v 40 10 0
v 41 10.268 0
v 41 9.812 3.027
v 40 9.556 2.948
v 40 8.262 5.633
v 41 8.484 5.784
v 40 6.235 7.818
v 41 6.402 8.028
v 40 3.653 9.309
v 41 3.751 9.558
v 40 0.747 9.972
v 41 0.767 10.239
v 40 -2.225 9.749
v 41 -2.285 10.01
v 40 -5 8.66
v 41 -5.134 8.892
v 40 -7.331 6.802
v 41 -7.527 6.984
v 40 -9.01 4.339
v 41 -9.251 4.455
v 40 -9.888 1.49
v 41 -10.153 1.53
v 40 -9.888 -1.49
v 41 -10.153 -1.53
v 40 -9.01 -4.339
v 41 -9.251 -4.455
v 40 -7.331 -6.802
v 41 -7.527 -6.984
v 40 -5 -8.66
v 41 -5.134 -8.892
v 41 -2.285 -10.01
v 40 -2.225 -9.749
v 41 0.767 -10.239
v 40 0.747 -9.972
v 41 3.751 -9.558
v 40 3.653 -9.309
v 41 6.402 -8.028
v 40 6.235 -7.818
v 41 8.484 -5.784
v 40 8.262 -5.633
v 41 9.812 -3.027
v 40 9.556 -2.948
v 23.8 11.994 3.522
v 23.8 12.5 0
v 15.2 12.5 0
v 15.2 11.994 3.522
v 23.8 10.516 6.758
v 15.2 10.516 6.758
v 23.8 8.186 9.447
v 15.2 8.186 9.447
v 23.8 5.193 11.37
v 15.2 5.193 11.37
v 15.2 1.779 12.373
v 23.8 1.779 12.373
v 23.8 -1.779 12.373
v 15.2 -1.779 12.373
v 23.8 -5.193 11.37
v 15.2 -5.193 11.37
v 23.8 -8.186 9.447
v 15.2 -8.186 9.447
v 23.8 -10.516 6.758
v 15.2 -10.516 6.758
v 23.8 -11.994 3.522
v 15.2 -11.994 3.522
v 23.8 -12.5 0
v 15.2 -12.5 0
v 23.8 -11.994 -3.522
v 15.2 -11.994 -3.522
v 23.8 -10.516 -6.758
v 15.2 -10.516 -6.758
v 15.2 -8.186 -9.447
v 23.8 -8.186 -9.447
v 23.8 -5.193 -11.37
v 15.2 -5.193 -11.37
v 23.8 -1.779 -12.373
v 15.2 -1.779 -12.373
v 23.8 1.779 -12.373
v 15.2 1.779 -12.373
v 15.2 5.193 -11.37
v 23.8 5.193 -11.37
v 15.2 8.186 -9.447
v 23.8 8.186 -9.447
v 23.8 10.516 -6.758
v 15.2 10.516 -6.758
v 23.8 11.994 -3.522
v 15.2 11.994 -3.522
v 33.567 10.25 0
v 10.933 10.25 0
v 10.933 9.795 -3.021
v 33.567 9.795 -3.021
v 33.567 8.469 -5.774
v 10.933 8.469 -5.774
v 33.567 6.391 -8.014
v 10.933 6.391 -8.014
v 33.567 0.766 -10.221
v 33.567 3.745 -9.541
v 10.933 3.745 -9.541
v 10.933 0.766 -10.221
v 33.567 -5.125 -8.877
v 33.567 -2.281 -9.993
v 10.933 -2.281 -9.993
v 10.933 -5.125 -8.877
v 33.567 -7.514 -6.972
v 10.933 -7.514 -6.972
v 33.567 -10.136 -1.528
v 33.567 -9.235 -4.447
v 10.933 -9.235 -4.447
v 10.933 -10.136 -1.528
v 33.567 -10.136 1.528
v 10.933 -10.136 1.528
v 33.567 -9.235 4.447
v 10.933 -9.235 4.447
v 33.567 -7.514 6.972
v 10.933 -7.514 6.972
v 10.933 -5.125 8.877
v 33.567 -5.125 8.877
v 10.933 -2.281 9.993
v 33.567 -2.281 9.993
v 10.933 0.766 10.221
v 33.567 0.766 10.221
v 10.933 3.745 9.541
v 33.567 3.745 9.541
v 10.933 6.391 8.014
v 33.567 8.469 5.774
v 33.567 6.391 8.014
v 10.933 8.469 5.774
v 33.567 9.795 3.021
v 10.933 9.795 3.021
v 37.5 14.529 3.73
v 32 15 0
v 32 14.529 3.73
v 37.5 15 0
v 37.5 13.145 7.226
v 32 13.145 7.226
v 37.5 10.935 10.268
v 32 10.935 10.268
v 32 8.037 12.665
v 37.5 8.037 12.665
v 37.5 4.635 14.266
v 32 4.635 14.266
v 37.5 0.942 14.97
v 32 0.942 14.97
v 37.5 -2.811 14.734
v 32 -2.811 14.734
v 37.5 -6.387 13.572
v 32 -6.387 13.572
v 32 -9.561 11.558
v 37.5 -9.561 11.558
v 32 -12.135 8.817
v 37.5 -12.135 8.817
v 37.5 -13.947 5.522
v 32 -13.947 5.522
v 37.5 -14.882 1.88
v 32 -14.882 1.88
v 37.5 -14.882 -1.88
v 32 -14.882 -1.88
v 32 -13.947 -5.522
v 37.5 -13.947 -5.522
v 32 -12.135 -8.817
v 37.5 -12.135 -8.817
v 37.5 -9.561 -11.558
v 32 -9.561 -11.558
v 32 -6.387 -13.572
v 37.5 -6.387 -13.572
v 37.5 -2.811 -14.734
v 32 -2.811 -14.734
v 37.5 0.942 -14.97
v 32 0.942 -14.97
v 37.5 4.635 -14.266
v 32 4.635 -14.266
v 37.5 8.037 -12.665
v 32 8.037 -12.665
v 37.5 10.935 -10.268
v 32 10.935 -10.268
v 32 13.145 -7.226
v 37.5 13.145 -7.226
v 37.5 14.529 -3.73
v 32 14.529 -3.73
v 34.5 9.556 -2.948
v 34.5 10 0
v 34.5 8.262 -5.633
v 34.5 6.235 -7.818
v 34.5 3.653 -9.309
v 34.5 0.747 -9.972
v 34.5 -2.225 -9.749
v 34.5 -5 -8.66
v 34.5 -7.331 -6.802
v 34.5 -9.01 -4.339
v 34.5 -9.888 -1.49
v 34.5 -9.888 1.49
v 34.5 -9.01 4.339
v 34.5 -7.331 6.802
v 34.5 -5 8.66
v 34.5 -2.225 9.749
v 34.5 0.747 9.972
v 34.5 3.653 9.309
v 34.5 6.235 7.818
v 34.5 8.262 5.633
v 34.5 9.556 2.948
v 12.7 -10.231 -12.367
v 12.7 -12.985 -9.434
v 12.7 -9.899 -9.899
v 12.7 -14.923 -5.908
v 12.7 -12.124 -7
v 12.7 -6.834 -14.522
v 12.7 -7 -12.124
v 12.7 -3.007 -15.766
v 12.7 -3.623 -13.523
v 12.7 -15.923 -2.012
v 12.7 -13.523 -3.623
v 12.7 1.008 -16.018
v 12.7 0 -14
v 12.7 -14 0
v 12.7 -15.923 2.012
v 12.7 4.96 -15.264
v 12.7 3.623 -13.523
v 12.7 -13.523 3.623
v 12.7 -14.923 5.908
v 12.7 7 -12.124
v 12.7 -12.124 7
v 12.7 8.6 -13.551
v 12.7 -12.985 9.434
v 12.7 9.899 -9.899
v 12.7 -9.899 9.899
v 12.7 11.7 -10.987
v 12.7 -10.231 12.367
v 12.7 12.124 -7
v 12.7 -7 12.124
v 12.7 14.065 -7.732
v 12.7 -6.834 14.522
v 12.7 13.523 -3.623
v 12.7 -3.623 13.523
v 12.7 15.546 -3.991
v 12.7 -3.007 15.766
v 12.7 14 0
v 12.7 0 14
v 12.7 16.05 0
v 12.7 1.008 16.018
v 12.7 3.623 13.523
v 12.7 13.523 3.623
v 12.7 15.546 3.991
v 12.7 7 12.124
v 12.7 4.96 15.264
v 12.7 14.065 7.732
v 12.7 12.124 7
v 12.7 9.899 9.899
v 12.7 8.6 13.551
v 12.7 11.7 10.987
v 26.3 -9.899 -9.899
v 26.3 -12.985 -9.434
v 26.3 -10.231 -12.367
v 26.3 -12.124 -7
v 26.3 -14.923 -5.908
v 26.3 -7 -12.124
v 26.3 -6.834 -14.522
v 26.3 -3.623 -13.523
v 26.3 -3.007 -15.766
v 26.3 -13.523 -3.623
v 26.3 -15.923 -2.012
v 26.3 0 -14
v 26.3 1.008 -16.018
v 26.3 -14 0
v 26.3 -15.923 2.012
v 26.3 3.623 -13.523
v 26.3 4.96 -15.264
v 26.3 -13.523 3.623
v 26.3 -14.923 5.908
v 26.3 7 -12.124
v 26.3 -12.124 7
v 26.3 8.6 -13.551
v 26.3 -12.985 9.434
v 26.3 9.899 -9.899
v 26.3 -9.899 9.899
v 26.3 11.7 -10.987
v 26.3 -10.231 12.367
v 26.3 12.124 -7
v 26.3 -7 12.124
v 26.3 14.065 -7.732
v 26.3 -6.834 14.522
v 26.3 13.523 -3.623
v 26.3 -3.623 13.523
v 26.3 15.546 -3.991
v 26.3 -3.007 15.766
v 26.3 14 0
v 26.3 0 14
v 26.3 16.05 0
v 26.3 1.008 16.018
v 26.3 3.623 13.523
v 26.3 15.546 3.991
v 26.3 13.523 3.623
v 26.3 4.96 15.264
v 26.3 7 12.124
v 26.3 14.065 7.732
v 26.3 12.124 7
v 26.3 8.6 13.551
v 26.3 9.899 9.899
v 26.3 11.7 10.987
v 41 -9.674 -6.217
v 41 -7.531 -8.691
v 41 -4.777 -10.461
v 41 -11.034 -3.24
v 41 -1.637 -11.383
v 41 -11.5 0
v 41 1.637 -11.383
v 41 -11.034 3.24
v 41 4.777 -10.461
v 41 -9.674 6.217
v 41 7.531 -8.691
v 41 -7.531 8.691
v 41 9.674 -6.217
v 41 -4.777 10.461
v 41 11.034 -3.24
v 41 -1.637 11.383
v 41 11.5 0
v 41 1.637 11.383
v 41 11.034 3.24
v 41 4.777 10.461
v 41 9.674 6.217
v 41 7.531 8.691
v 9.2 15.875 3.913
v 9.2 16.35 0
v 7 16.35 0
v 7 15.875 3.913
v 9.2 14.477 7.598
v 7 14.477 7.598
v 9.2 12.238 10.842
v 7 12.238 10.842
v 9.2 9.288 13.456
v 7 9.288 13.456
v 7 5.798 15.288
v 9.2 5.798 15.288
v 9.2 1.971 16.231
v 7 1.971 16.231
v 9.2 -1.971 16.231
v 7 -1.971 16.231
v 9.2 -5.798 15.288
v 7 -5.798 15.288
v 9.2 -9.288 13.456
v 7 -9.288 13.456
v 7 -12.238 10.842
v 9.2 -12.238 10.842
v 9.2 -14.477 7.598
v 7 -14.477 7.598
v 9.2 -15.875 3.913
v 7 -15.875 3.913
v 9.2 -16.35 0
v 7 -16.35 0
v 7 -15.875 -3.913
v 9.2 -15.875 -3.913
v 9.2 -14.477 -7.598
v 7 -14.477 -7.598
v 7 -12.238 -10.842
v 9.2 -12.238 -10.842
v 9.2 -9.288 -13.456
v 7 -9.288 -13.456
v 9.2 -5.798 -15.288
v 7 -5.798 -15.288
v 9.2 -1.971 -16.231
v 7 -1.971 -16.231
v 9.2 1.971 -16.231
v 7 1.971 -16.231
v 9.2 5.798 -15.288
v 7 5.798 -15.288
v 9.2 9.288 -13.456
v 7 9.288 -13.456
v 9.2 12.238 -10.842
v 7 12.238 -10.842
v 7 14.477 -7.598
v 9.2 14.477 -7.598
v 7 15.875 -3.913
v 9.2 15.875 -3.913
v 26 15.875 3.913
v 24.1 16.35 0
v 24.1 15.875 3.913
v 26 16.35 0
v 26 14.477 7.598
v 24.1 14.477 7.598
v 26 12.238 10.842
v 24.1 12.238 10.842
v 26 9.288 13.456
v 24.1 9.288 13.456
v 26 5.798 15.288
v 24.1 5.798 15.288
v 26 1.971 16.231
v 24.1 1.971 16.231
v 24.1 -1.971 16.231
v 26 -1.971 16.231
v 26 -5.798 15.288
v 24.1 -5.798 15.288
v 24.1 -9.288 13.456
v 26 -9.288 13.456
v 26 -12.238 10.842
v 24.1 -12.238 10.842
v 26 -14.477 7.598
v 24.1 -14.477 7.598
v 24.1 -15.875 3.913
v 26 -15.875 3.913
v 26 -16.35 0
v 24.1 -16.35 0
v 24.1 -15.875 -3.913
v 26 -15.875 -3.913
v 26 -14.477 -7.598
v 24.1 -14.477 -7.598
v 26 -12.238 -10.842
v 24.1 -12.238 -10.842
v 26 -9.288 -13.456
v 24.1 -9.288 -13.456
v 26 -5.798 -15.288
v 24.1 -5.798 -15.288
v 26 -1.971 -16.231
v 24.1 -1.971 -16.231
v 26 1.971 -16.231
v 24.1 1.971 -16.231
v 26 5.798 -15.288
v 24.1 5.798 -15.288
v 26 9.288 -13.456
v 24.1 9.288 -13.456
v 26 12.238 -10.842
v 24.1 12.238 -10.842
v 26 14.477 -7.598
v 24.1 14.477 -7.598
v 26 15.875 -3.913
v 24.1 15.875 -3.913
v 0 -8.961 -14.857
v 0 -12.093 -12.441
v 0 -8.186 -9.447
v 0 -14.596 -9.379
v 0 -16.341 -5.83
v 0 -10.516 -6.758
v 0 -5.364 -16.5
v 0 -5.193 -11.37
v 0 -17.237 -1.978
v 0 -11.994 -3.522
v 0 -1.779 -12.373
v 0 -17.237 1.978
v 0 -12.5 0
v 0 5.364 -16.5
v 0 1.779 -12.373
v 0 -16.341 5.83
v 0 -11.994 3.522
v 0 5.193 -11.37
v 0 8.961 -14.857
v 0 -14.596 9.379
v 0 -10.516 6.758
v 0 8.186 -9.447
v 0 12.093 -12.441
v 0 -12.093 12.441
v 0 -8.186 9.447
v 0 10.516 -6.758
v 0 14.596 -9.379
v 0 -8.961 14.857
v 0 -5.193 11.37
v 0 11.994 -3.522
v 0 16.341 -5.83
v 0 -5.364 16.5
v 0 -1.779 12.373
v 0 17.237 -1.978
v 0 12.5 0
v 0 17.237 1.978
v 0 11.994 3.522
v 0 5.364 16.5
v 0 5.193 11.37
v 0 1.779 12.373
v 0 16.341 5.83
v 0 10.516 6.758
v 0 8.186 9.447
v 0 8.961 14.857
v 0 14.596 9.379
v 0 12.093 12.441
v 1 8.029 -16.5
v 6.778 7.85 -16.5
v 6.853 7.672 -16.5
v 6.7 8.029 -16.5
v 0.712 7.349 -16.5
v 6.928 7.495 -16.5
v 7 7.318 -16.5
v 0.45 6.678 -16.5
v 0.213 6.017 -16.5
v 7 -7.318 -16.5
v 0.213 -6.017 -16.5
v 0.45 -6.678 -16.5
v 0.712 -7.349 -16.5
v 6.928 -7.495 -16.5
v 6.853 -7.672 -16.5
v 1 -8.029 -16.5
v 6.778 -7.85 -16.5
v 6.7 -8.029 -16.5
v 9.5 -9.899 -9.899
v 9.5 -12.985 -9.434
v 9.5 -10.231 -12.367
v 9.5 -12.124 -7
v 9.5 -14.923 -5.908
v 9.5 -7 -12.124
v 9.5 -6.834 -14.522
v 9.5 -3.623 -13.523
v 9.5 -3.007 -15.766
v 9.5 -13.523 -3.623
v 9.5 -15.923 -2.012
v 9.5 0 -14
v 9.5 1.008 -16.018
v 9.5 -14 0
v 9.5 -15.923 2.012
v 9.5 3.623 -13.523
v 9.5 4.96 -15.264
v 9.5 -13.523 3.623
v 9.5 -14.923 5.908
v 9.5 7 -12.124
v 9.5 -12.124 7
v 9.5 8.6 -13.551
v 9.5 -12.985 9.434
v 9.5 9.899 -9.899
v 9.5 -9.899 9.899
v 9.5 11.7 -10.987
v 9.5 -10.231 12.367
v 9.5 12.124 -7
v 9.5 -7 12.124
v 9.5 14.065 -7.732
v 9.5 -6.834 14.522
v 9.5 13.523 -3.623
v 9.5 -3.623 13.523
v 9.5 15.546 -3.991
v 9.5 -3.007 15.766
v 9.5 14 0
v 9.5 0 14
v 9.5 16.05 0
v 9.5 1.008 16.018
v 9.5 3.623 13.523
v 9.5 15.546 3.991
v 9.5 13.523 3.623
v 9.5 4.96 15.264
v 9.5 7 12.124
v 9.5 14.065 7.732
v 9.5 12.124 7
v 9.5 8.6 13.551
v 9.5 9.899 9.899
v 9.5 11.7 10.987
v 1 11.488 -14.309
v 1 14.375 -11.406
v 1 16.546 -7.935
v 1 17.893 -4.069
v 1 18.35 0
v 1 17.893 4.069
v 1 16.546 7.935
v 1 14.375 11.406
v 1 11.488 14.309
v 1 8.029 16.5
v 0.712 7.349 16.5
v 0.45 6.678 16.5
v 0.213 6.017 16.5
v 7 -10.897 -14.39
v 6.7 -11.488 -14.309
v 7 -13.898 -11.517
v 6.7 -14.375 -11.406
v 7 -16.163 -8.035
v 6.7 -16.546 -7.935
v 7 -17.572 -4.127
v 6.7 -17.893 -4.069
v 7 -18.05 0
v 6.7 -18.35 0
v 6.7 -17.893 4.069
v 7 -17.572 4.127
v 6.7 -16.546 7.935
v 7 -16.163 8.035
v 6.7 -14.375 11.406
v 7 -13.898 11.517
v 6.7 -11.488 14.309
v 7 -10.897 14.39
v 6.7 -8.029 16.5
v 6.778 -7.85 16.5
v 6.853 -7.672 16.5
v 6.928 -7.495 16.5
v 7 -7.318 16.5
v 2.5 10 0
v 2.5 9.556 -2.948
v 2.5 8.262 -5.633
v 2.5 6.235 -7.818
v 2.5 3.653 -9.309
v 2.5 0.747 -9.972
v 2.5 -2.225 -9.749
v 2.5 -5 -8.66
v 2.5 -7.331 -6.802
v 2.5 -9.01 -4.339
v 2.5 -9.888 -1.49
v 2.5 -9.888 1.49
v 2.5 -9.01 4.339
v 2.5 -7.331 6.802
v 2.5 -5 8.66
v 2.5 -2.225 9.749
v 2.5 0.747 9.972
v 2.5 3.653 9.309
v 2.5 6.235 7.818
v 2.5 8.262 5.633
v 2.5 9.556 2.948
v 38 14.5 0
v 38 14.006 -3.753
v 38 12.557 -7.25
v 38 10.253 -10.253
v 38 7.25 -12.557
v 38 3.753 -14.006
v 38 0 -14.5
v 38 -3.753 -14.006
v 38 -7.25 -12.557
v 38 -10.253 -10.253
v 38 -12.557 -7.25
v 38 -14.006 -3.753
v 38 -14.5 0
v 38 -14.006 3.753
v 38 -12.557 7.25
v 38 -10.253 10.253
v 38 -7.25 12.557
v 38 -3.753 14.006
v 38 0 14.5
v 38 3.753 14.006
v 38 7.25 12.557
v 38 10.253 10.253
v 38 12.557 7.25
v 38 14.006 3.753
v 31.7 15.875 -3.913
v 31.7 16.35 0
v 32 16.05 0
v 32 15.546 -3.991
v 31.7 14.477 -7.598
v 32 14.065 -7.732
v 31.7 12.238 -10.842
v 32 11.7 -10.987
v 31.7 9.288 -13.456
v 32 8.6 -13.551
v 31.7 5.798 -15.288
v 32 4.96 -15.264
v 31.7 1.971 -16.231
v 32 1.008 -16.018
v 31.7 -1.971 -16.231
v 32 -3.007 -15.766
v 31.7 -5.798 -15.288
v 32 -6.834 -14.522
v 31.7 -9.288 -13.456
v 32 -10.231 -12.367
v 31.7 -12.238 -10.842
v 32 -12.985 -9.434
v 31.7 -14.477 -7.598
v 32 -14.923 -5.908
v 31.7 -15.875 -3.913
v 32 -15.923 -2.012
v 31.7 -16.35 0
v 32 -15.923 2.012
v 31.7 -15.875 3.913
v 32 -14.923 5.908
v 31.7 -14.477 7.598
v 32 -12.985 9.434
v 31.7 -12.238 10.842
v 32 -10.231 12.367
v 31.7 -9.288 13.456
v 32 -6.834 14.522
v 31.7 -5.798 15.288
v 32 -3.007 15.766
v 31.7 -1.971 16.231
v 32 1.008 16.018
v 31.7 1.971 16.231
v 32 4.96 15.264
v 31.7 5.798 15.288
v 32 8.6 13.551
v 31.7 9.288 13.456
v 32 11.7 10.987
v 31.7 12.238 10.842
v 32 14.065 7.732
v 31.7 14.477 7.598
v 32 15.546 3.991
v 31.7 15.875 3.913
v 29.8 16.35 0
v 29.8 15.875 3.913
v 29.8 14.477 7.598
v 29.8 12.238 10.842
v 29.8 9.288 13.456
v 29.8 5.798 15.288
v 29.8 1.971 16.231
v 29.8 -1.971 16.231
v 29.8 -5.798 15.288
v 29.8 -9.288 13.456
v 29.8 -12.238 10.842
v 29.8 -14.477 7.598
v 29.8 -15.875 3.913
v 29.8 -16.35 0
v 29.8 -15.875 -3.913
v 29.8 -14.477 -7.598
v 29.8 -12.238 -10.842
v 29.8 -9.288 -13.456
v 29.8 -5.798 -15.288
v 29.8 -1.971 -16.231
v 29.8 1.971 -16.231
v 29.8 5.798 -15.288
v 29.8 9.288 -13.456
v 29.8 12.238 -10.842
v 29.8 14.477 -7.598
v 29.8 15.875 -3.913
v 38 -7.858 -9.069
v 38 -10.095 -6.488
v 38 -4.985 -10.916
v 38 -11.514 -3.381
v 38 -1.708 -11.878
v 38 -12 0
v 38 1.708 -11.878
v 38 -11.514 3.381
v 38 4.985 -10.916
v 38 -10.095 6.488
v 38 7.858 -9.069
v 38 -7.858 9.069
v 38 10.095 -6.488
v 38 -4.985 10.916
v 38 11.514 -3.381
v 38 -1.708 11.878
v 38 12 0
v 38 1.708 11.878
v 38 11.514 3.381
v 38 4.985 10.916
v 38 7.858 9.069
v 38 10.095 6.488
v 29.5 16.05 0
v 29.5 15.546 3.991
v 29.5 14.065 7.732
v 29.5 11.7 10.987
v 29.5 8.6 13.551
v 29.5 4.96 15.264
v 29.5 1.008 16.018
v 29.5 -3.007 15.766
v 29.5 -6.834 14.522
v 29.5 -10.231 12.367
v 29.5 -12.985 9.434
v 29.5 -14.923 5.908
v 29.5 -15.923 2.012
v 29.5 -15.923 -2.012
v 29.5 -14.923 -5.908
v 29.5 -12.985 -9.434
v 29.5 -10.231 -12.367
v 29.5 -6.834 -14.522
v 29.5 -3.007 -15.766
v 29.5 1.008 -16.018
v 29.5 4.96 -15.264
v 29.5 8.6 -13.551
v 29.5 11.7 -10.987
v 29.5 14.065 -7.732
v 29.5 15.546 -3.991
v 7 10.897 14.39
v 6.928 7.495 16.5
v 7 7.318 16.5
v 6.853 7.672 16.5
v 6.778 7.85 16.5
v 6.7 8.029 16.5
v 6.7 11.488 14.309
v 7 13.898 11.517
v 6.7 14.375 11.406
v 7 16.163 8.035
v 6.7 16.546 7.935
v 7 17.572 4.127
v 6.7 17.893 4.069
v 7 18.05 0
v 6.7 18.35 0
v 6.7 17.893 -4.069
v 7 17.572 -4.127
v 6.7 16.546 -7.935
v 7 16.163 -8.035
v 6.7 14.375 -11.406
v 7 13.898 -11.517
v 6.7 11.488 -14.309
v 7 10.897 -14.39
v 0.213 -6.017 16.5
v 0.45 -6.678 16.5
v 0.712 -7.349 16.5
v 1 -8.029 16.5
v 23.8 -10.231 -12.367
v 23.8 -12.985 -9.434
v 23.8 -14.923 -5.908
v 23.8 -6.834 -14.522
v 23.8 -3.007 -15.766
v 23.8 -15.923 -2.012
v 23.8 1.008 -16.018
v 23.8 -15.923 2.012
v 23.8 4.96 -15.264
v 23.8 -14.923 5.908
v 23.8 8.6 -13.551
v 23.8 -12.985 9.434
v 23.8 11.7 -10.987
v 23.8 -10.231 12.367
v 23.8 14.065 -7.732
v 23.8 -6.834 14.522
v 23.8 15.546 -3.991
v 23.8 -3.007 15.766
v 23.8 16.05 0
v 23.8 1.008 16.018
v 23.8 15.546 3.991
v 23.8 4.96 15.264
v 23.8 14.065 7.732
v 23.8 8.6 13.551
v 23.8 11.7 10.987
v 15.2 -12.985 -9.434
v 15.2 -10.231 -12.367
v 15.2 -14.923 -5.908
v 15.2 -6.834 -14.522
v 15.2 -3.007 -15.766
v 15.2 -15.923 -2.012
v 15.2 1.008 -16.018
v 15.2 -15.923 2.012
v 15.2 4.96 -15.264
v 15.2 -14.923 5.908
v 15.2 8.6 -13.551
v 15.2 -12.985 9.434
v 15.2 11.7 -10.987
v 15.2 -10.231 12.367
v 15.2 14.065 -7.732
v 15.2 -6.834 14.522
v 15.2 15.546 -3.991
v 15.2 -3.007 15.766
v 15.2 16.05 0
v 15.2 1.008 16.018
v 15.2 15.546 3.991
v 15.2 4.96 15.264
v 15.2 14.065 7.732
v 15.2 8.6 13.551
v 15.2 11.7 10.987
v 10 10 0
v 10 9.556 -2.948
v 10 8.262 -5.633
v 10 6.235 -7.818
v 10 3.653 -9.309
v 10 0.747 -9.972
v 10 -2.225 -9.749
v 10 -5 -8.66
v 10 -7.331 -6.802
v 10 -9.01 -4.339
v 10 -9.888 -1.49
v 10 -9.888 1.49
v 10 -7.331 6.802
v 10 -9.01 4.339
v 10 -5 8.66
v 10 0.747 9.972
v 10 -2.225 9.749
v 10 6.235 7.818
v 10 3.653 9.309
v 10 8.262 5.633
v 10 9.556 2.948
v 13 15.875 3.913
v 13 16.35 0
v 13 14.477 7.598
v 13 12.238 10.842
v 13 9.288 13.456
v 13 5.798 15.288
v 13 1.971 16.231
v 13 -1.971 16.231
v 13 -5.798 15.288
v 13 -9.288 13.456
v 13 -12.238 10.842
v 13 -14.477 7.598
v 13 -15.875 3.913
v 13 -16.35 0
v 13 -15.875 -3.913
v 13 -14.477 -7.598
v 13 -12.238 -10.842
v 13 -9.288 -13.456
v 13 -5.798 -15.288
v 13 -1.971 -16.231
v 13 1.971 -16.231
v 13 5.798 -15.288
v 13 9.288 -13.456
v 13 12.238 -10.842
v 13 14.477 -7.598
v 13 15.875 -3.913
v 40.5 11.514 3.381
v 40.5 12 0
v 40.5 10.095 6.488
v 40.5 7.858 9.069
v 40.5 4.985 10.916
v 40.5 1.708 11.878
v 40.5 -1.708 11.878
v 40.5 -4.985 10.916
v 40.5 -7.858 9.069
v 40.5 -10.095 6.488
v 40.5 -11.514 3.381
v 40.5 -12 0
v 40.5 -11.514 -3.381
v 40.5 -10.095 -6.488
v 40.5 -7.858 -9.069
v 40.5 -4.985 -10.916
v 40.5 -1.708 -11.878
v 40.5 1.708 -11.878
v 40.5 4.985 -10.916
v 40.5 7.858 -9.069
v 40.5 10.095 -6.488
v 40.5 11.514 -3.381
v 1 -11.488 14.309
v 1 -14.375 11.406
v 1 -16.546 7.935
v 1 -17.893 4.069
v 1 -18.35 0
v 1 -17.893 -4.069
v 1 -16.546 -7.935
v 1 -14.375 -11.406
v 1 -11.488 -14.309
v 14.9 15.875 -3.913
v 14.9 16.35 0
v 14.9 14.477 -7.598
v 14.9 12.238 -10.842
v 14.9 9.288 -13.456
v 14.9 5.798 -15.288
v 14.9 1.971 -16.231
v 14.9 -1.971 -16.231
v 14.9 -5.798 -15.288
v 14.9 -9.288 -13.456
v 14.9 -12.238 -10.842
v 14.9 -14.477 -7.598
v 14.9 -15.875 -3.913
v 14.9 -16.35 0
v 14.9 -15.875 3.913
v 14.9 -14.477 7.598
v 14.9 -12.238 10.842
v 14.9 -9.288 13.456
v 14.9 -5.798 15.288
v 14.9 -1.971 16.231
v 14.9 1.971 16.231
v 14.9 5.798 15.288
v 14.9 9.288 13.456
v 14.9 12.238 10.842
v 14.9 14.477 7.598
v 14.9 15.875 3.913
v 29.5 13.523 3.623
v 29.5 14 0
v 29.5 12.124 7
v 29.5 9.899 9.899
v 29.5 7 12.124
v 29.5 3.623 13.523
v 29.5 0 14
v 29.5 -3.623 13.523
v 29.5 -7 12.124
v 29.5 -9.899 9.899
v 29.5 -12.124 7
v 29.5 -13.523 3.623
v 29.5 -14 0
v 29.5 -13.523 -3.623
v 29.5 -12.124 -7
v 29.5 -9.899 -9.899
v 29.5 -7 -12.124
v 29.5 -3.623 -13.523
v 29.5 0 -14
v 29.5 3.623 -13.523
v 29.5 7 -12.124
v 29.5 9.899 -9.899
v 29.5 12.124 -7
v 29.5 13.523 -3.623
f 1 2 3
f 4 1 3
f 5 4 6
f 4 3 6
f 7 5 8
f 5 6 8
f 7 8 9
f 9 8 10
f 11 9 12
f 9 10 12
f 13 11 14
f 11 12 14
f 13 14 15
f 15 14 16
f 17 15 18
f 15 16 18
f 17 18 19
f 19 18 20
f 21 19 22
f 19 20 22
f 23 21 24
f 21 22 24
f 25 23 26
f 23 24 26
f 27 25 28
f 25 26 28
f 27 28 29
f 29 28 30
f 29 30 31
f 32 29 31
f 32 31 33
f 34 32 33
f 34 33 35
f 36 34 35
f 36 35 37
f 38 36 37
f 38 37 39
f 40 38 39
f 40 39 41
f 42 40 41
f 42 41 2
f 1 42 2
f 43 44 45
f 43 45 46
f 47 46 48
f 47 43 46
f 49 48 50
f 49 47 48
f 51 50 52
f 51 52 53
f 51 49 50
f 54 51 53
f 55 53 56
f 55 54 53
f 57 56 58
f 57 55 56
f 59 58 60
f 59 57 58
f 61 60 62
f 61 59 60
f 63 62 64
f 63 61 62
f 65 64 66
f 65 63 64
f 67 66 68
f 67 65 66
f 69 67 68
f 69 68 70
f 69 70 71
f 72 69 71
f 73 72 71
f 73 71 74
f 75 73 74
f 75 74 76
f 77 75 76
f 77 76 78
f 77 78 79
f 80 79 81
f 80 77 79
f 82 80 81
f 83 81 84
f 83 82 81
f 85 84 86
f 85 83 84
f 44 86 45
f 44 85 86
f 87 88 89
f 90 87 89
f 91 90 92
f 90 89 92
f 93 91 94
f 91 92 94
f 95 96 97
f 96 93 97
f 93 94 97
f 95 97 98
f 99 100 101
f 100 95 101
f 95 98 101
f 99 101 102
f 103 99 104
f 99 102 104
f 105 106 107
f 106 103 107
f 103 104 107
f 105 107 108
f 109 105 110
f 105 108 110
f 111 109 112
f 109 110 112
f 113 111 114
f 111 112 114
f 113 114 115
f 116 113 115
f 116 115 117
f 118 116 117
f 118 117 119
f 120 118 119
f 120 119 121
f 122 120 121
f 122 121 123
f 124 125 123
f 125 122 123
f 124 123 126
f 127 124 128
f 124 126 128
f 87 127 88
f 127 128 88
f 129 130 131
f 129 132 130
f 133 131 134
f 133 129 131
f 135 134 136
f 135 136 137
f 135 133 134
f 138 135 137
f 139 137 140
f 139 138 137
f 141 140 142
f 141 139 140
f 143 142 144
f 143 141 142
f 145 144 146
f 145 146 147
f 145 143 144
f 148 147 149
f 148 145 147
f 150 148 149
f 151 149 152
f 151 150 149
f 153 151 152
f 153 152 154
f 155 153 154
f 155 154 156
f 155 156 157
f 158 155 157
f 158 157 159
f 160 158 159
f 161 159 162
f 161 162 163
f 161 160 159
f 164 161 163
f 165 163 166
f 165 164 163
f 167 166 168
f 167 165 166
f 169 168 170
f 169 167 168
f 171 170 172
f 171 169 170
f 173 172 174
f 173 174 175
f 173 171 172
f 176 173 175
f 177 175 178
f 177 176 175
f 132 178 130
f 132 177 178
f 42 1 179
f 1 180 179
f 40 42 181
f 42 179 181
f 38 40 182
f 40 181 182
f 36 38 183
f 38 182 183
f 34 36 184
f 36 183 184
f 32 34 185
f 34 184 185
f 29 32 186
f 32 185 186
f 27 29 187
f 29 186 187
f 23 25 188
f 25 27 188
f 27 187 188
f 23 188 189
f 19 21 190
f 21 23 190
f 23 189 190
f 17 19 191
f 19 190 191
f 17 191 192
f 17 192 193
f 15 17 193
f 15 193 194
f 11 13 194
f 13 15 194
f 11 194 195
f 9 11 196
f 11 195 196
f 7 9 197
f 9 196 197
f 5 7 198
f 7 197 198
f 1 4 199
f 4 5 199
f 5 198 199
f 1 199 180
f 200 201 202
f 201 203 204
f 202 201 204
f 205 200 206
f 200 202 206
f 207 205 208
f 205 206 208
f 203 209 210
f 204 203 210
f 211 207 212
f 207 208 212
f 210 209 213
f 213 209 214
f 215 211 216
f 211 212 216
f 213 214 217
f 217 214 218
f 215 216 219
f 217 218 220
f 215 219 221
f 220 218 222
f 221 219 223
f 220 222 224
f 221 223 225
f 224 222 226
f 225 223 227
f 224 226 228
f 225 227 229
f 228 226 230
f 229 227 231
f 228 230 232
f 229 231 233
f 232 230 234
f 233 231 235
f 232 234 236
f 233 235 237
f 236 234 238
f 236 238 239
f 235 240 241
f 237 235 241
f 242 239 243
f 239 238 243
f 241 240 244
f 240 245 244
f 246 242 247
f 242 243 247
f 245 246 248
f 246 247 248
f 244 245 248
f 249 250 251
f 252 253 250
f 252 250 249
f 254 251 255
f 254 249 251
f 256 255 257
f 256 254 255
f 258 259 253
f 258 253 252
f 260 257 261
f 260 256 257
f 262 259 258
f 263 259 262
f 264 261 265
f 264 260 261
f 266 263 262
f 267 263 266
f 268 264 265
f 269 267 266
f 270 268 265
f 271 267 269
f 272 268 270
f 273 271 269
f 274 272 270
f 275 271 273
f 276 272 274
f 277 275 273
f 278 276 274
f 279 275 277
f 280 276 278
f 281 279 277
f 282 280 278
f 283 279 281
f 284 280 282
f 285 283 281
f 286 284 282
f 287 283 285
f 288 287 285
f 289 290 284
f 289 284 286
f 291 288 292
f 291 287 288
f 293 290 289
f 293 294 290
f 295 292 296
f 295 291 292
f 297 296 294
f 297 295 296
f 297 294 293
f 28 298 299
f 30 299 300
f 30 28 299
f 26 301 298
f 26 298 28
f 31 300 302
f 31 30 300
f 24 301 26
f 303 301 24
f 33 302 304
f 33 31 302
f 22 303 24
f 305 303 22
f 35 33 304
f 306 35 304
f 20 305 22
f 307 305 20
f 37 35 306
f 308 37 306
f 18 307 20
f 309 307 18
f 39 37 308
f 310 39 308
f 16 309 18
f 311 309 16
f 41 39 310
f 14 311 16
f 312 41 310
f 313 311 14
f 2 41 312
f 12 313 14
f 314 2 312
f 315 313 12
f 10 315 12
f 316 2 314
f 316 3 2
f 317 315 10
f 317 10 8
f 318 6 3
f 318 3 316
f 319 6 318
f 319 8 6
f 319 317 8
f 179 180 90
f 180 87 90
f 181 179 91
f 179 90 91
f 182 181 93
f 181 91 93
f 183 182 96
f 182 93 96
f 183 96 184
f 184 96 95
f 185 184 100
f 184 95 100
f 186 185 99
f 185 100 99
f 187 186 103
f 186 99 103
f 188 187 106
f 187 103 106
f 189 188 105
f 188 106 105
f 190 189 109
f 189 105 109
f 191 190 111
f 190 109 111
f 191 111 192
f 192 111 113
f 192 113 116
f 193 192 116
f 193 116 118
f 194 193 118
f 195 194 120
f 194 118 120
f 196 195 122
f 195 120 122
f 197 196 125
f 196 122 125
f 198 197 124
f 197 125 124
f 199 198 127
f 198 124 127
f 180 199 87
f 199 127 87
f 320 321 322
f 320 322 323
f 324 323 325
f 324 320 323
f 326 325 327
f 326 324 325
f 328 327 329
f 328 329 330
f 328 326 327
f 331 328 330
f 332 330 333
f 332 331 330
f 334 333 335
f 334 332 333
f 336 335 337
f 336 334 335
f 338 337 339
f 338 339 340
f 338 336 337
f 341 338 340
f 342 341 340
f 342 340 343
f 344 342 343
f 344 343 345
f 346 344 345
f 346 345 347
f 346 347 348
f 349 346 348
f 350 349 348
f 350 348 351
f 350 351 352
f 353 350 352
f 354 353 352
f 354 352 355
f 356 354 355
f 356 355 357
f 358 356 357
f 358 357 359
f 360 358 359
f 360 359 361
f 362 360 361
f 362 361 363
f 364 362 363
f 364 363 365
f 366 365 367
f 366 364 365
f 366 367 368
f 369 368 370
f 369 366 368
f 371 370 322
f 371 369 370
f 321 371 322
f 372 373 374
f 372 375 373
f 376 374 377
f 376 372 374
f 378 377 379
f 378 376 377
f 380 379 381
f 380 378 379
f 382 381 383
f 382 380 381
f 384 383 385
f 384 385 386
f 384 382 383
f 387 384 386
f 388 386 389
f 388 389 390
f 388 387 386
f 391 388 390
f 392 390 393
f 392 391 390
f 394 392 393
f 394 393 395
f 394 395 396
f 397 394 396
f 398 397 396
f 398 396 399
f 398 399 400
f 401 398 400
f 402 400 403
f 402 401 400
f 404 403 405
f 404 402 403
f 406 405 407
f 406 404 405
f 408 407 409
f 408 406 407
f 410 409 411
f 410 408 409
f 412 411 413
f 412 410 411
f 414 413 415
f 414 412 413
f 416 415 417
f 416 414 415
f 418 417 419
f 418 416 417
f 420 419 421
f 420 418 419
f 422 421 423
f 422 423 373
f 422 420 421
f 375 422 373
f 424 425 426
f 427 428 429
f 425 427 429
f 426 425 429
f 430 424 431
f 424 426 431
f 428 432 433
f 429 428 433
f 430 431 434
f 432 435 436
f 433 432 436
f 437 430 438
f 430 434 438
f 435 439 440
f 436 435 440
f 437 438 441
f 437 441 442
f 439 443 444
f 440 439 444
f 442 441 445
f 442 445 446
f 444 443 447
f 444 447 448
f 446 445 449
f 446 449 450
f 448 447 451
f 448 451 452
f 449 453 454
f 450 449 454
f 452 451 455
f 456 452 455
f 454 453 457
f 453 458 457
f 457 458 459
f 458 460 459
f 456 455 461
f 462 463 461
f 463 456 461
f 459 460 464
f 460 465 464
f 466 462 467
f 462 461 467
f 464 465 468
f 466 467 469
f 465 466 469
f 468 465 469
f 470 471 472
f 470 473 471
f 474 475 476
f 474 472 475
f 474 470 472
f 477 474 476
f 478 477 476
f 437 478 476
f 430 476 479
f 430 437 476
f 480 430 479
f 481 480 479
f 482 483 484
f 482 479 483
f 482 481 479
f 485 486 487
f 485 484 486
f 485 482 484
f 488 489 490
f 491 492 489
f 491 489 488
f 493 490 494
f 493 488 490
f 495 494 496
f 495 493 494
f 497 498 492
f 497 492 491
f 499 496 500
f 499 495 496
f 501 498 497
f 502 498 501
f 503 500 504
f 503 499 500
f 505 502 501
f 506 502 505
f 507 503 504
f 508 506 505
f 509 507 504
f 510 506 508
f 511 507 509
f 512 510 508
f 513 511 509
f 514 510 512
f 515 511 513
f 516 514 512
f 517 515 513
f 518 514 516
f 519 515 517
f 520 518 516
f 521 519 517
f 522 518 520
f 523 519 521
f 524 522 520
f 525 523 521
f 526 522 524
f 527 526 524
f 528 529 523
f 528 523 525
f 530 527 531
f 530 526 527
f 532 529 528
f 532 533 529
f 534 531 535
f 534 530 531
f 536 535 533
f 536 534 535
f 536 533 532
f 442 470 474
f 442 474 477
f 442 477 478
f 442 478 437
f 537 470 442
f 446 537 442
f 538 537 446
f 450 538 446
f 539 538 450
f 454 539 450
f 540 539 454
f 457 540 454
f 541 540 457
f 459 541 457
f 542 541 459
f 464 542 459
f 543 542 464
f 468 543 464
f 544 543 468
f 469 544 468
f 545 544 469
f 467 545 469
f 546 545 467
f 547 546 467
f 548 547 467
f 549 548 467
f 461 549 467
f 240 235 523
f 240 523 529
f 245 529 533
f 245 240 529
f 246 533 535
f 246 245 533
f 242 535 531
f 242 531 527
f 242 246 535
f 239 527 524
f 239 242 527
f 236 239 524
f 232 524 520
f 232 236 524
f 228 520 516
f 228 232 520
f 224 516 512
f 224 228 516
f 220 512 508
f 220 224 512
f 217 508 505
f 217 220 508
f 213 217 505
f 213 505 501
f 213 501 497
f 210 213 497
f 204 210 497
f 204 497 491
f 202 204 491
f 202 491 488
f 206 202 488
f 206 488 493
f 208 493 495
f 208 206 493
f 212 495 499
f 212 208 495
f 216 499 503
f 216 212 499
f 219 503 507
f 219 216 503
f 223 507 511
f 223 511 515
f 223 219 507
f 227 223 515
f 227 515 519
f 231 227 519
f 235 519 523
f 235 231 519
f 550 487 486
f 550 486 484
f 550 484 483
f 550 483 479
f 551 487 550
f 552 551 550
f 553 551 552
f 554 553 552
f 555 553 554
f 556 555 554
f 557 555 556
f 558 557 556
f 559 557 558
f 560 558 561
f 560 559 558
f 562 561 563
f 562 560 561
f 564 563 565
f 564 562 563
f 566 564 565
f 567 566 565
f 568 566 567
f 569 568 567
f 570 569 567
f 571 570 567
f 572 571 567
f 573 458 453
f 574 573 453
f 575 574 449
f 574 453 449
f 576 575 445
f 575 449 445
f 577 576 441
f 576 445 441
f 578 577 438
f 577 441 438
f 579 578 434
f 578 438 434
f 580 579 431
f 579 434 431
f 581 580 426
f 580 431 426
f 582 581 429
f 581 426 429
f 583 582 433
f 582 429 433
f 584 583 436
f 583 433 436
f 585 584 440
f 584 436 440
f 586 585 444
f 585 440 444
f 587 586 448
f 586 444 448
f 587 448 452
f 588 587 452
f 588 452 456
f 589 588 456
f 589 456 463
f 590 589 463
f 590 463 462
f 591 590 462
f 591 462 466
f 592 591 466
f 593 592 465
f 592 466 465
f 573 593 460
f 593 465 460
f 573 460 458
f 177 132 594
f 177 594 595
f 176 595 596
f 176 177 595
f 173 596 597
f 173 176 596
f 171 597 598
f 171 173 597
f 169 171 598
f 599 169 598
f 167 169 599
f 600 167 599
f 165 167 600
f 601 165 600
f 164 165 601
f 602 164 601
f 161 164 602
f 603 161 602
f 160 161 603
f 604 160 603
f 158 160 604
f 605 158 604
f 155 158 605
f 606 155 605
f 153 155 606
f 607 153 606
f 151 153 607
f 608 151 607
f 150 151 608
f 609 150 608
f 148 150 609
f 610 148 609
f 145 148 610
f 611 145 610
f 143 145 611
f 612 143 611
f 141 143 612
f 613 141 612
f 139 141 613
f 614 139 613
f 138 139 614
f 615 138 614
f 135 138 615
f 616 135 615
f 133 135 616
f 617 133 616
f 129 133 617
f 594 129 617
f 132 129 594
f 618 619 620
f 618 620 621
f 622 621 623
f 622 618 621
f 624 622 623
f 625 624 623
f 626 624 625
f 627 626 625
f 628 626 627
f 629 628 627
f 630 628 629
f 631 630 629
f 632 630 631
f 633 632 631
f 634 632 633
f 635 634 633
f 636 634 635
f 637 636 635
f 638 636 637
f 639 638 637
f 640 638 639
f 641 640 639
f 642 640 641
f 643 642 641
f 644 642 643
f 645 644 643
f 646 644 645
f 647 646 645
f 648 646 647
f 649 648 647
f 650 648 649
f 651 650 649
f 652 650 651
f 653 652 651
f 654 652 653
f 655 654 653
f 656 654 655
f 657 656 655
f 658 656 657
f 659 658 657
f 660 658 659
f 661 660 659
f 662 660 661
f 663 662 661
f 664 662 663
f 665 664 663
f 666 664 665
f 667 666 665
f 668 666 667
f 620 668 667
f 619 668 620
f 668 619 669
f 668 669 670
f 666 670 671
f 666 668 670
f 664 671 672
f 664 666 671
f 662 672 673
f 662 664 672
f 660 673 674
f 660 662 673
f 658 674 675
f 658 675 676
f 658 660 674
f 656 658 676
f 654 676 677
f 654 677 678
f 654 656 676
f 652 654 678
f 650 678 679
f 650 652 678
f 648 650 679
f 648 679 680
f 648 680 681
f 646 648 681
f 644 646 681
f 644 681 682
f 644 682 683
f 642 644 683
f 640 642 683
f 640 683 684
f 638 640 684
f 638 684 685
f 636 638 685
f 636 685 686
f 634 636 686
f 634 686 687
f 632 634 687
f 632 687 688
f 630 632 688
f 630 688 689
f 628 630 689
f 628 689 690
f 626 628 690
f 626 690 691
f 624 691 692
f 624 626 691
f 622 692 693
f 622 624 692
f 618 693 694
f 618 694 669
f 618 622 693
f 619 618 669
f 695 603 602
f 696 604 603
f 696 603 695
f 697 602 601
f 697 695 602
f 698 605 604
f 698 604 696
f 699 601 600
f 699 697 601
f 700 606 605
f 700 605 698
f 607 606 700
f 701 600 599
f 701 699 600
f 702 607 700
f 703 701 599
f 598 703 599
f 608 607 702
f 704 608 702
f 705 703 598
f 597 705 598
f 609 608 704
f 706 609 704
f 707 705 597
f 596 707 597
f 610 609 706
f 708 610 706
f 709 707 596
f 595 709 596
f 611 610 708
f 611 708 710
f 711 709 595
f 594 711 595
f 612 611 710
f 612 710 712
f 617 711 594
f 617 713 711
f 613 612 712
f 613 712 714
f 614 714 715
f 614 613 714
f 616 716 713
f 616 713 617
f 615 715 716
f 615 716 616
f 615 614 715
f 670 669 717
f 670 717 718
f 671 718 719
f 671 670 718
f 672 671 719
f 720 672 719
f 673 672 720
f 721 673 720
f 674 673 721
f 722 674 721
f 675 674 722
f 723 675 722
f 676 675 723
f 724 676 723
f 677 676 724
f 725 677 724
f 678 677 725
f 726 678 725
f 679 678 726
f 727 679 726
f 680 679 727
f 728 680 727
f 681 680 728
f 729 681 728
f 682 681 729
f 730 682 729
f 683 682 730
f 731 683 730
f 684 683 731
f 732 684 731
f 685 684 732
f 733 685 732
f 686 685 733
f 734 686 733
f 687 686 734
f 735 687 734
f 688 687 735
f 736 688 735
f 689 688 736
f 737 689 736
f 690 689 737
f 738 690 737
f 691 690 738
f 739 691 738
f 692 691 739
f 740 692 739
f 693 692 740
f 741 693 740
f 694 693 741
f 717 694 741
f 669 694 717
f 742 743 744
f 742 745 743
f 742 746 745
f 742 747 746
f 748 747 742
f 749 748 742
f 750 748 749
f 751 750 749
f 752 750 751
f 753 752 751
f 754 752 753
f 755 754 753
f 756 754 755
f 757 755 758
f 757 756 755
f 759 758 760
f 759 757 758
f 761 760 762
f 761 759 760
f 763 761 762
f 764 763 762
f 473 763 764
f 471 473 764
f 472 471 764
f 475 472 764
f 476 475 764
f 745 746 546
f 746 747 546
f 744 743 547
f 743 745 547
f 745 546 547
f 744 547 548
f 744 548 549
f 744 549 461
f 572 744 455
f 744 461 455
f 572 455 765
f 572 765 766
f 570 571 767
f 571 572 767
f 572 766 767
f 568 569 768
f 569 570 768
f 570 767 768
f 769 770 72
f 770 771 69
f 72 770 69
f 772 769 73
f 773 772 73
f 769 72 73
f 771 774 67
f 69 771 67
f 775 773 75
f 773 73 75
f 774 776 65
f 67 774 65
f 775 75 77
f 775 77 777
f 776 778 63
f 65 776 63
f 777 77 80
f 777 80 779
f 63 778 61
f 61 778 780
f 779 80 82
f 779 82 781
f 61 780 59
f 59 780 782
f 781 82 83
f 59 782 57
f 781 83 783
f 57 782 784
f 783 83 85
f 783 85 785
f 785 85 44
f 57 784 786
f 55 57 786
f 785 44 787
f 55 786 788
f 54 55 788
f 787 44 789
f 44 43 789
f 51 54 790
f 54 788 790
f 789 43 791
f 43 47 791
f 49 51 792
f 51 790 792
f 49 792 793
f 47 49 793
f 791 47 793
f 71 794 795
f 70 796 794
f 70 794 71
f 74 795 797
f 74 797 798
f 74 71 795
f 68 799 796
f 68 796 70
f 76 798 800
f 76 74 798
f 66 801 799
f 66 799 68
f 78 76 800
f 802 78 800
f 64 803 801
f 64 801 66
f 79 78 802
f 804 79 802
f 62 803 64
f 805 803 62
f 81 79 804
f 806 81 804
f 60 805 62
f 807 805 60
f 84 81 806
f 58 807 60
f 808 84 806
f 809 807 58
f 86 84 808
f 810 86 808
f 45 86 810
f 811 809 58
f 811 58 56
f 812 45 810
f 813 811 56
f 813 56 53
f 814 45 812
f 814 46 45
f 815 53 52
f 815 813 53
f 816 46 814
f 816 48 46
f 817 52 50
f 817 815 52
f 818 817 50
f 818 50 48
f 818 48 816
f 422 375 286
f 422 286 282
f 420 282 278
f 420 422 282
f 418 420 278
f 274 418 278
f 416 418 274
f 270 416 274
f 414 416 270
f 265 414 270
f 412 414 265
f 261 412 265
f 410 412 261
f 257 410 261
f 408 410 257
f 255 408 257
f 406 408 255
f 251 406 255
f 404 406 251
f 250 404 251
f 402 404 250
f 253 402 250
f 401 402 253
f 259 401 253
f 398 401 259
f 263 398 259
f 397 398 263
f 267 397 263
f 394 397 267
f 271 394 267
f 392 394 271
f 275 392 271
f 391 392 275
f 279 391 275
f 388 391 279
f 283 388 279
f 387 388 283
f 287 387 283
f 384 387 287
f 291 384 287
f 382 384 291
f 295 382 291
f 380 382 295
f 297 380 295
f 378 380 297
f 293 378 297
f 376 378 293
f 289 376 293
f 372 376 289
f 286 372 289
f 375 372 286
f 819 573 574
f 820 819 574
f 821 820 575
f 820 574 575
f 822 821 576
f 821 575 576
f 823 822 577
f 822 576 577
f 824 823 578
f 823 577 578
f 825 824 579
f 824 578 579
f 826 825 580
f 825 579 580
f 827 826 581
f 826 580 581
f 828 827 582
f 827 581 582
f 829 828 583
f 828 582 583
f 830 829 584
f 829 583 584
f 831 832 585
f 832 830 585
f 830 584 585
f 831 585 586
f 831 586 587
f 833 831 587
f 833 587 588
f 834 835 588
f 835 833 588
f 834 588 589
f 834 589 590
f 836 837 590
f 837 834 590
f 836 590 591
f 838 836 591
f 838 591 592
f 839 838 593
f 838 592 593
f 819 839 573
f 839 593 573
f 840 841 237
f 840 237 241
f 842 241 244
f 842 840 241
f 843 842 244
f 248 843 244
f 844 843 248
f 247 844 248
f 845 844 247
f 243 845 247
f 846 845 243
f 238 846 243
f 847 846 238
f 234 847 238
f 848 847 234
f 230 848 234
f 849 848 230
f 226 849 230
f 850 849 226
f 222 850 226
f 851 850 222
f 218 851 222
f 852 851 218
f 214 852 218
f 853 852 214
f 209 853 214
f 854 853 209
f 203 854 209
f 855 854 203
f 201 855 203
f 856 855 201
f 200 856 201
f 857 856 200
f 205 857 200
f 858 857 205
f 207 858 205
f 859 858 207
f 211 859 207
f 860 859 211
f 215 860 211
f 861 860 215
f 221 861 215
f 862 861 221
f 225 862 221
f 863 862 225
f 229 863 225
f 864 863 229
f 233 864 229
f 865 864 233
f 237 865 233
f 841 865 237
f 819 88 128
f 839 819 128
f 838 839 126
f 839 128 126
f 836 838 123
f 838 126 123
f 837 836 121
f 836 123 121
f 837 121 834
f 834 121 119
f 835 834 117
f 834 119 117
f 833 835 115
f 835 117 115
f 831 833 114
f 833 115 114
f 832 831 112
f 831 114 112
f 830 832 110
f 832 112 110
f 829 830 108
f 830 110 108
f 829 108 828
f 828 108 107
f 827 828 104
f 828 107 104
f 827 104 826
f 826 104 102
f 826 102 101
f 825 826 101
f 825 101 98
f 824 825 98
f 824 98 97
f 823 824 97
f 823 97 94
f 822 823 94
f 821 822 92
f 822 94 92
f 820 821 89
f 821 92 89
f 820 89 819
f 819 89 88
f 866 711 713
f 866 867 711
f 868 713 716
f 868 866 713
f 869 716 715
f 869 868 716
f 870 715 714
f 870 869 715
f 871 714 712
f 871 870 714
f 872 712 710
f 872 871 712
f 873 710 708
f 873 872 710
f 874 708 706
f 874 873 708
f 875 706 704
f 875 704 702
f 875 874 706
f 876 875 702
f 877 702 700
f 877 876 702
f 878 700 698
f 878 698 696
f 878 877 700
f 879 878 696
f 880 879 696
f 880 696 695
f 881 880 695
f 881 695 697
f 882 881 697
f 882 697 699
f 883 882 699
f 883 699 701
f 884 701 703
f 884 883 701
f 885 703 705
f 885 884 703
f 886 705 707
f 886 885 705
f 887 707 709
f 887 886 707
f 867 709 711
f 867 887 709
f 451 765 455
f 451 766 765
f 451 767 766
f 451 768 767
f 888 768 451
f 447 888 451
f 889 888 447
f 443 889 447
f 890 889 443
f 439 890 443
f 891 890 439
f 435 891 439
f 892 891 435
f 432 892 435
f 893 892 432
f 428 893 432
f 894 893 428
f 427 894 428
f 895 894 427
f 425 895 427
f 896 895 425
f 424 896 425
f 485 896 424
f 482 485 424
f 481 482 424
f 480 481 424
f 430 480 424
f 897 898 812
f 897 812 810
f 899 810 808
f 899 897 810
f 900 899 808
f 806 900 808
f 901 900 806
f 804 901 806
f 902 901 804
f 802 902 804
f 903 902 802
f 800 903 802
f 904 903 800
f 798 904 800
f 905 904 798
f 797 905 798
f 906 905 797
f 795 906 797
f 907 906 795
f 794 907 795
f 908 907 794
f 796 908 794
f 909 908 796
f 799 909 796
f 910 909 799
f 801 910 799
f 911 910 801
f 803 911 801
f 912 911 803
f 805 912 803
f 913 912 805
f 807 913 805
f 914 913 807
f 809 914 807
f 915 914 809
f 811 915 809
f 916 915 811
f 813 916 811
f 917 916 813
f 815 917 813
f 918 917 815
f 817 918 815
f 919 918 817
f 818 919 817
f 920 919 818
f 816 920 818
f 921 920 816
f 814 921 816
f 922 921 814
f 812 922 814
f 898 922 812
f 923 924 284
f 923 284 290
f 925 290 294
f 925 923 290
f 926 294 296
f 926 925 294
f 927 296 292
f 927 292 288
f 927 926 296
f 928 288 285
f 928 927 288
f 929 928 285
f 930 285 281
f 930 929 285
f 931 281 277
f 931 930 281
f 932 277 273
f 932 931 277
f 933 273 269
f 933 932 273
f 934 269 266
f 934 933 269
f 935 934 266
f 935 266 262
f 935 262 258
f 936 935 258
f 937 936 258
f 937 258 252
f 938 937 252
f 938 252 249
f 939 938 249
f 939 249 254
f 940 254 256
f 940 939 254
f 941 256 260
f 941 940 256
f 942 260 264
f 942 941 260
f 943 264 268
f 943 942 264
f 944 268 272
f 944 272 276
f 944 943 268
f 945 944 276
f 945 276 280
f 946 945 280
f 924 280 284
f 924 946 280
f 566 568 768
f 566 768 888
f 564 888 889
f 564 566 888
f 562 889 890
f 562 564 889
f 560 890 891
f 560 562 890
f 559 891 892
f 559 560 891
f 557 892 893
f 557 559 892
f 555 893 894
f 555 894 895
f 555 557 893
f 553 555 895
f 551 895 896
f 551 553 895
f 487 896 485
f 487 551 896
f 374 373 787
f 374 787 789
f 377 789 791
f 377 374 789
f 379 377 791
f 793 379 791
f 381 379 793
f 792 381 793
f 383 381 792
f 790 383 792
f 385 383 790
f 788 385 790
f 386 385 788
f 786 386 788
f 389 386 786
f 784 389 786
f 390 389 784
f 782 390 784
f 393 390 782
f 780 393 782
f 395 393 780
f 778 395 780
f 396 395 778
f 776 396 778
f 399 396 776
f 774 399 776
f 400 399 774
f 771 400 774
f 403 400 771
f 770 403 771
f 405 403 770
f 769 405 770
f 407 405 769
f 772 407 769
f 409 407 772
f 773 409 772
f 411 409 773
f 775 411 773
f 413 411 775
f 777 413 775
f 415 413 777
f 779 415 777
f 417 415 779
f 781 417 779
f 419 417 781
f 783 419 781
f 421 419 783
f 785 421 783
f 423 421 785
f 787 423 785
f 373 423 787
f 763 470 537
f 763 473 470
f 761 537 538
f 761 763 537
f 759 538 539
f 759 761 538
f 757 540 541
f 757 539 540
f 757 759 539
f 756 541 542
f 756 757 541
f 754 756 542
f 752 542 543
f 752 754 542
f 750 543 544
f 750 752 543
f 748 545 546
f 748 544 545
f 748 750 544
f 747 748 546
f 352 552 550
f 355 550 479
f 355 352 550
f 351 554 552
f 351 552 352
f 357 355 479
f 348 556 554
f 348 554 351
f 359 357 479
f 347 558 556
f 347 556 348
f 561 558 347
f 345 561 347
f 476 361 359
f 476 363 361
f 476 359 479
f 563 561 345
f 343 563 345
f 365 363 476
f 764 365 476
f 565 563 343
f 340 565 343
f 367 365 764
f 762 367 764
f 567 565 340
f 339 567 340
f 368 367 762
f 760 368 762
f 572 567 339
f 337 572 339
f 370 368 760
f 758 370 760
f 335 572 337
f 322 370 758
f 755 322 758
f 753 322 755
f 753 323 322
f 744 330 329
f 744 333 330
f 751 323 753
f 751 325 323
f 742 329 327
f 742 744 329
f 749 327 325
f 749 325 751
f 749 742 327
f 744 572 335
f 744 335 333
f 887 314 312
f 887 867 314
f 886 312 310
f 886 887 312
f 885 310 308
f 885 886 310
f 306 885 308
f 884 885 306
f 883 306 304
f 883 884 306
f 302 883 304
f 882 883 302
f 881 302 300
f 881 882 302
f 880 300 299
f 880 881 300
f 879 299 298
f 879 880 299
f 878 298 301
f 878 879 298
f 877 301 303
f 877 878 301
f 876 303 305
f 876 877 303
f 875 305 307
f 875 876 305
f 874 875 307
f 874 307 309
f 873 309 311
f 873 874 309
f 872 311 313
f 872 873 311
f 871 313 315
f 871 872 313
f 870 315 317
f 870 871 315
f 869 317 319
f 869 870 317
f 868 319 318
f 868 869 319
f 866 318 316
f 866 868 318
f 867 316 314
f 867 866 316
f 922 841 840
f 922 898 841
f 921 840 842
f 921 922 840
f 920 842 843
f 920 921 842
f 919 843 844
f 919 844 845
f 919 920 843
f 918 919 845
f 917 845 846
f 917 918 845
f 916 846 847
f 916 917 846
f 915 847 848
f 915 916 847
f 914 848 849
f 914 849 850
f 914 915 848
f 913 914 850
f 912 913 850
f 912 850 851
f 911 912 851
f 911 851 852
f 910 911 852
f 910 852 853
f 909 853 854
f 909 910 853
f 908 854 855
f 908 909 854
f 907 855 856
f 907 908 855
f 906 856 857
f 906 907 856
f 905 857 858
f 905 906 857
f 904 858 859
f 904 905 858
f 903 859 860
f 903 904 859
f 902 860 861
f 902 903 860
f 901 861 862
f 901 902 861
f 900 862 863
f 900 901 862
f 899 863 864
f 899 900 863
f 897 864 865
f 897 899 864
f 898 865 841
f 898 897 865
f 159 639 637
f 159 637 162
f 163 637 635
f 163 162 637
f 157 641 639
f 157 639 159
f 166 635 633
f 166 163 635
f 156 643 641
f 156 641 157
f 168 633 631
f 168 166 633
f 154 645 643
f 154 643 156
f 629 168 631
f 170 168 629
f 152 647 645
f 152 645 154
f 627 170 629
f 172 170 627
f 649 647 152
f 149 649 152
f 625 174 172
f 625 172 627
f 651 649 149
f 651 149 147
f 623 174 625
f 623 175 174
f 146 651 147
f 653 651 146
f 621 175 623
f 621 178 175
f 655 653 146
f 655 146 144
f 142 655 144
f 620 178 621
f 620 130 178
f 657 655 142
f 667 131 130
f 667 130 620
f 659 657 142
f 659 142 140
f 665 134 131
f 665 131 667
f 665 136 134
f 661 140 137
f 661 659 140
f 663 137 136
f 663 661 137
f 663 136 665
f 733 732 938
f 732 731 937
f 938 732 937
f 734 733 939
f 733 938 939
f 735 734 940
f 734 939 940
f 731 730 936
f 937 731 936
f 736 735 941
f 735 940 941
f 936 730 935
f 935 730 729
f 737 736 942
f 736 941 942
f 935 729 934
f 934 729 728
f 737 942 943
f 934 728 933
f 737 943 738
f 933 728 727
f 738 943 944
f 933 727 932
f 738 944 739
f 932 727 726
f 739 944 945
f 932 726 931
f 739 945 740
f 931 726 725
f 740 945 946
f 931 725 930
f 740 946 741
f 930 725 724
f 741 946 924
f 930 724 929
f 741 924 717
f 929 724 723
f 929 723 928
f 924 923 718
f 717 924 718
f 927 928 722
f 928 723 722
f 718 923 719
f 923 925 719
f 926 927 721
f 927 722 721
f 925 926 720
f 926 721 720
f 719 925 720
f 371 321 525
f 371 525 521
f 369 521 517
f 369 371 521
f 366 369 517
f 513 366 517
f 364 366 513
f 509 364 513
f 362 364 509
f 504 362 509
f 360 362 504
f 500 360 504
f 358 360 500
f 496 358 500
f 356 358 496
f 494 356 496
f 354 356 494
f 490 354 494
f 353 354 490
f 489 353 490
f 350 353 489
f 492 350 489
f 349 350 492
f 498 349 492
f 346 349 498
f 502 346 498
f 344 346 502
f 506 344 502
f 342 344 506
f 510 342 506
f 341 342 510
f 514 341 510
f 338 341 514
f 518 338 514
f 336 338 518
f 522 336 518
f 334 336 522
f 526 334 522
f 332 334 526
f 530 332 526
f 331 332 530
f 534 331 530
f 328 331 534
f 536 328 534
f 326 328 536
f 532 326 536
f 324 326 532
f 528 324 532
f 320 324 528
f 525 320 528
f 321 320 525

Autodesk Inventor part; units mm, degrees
ref_plane "YZ Plane" through (0, 0, 0) normal (1, 0, 0) x (0, 1, 0)
ref_plane "XZ Plane" through (0, 0, 0) normal (0, 1, 0) x (-1, 0, 0)
ref_plane "XY Plane" through (0, 0, 0) normal (0, 0, 1) x (1, 0, 0)
sketch "Náčrt1" plane through (0, 0, 0) normal (0, 0, 1) x (1, 0, 0)
  line L0 (0, 0) -> (20.108, 0)
  line L1 (0, 12.5) -> (0, 18.35)
  line L2 (0, 18.35) -> (7, 18.35)
  line L3 (7, 18.35) -> (7, 16.35)
  line L4 (7, 16.35) -> (9.5, 16.35)
  line L5 (9.5, 16.35) -> (9.5, 14)
  line L6 (9.5, 14) -> (12.7, 14)
  line L7 (12.7, 14) -> (12.7, 16.35)
  line L8 (12.7, 16.35) -> (15.2, 16.35)
  line L9 (15.2, 16.35) -> (15.2, 12.5)
  line L10 (15.2, 12.5) -> (23.8, 12.5)
  line L11 (23.8, 12.5) -> (23.8, 16.35)
  line L12 (23.8, 16.35) -> (26.3, 16.35)
  line L13 (26.3, 16.35) -> (26.3, 14)
  line L14 (26.3, 14) -> (29.5, 14)
  line L15 (29.5, 14) -> (29.5, 16.35)
  line L16 (29.5, 16.35) -> (32, 16.35)
  line L17 (32, 16.35) -> (32, 15)
  line L18 (32, 15) -> (38, 15)
  line L19 (38, 15) -> (38, 12)
  line L20 (38, 12) -> (41, 12)
  line L21 (41, 12) -> (41, 10.2679)
  line L22 (40, 10) -> (34.5, 10)
  line L23 (33.567, 10.25) -> (10.933, 10.25)
  line L24 (10, 10) -> (2.5, 10)
  line L25 (34.5, 10) -> (33.567, 10.25)
  line L26 (10, 10) -> (10.933, 10.25)
  line L27 (0, 12.5) -> (2.5, 10)
  line L28 (40, 10) -> (41, 10.2679)
  dimension "d0" = 41
  dimension "d1" = 36.7
  dimension "d2" = 24
  dimension "d3" = 30
  dimension "d4" = 3
  dimension "d5" = 9
  dimension "d6" = 32.7
  dimension "d7" = 25
  dimension "d9" = 20
  dimension "d10" = 20
  dimension "d11" = 20.5
  dimension "d15" = 34
  dimension "d16" = 2.5
  dimension "d17" = 2.5
  dimension "d18" = 2.5
  dimension "d19" = 2.5
  dimension "d20" = 3.2
  dimension "d21" = 3.2
  dimension "d23" = 28
  dimension "d24" = 15
  dimension "d25" = 15
  dimension "d50" = 25
  dimension "d51" = 10
  dimension "d52" = 2.5
  dimension "d53" = 45
  dimension "d54" = 6.5
  dimension "d55" = 15
  dimension "d56" = 1
revolve "Rotace1" add sketch "Náčrt1" angle 360 about axis through (0, 0, 0) along (1, 0, 0)
chamfer "Zkosení1" distance 1 angle 45 1 edges at (0, -18.35, 0)
chamfer "Zkosení2" distance 0.3 angle 45 1 edges at (7, -18.35, 0)
chamfer "Zkosení3" distance 0.5 angle 45 1 edges at (41, -12, 0)
chamfer "Zkosení4" distance 0.3 angle 45 7 edges at (32, -16.35, 0) (29.5, -16.35, 0) (26.3, -16.35, 0) (23.8, -16.35, 0) (15.2, -16.35, 0) (12.7, -16.35, 0) (9.5, -16.35, 0)
thread "Závit1" size "M30x1.5" class "6g" standard "ANSI Metric M Profile" full length
chamfer "Zkosení5" distance 0.5 angle 45 1 edges at (38, -15, 0)
sketch "Náčrt2" plane through (0, 0, 0) normal (-1, 0, 0) x (0, 0, 1)
  line L0 (-20.0207, 8.0295) -> (-16.5, 8.0295)
  line L1 (-16.5, 8.0295) -> (-16.5, -8.0295)
  line L2 (-16.5, -8.0295) -> (-20.0207, -8.0295)
  line L3 (-20.0207, -8.0295) -> (-20.0207, 8.0295)
  line L4 (28.0067, 8.0295) -> (16.5, 8.0295)
  line L5 (16.5, 8.0295) -> (16.5, -8.0295)
  line L6 (16.5, -8.0295) -> (28.0067, -8.0295)
  line L7 (28.0067, -8.0295) -> (28.0067, 8.0295)
  circle A0 centre (0, 0) radius 18.35 construction
  line L8 (0, 0) -> (0, 5.8894) construction
  dimension "d46" = 33
extrude "Vysunutí1" cut sketch "Náčrt2" against normal through all
equation "\"d9\" = d10"
equation "\"Rozmer_A\" = d1"
equation "\"Rozmer_B\" = 0"
equation "\"Rozmer_C\" = 0"
equation "\"Rozmer_D\" = d0"
properties part number "NA-45-h-Crown-307" material "14 100"
